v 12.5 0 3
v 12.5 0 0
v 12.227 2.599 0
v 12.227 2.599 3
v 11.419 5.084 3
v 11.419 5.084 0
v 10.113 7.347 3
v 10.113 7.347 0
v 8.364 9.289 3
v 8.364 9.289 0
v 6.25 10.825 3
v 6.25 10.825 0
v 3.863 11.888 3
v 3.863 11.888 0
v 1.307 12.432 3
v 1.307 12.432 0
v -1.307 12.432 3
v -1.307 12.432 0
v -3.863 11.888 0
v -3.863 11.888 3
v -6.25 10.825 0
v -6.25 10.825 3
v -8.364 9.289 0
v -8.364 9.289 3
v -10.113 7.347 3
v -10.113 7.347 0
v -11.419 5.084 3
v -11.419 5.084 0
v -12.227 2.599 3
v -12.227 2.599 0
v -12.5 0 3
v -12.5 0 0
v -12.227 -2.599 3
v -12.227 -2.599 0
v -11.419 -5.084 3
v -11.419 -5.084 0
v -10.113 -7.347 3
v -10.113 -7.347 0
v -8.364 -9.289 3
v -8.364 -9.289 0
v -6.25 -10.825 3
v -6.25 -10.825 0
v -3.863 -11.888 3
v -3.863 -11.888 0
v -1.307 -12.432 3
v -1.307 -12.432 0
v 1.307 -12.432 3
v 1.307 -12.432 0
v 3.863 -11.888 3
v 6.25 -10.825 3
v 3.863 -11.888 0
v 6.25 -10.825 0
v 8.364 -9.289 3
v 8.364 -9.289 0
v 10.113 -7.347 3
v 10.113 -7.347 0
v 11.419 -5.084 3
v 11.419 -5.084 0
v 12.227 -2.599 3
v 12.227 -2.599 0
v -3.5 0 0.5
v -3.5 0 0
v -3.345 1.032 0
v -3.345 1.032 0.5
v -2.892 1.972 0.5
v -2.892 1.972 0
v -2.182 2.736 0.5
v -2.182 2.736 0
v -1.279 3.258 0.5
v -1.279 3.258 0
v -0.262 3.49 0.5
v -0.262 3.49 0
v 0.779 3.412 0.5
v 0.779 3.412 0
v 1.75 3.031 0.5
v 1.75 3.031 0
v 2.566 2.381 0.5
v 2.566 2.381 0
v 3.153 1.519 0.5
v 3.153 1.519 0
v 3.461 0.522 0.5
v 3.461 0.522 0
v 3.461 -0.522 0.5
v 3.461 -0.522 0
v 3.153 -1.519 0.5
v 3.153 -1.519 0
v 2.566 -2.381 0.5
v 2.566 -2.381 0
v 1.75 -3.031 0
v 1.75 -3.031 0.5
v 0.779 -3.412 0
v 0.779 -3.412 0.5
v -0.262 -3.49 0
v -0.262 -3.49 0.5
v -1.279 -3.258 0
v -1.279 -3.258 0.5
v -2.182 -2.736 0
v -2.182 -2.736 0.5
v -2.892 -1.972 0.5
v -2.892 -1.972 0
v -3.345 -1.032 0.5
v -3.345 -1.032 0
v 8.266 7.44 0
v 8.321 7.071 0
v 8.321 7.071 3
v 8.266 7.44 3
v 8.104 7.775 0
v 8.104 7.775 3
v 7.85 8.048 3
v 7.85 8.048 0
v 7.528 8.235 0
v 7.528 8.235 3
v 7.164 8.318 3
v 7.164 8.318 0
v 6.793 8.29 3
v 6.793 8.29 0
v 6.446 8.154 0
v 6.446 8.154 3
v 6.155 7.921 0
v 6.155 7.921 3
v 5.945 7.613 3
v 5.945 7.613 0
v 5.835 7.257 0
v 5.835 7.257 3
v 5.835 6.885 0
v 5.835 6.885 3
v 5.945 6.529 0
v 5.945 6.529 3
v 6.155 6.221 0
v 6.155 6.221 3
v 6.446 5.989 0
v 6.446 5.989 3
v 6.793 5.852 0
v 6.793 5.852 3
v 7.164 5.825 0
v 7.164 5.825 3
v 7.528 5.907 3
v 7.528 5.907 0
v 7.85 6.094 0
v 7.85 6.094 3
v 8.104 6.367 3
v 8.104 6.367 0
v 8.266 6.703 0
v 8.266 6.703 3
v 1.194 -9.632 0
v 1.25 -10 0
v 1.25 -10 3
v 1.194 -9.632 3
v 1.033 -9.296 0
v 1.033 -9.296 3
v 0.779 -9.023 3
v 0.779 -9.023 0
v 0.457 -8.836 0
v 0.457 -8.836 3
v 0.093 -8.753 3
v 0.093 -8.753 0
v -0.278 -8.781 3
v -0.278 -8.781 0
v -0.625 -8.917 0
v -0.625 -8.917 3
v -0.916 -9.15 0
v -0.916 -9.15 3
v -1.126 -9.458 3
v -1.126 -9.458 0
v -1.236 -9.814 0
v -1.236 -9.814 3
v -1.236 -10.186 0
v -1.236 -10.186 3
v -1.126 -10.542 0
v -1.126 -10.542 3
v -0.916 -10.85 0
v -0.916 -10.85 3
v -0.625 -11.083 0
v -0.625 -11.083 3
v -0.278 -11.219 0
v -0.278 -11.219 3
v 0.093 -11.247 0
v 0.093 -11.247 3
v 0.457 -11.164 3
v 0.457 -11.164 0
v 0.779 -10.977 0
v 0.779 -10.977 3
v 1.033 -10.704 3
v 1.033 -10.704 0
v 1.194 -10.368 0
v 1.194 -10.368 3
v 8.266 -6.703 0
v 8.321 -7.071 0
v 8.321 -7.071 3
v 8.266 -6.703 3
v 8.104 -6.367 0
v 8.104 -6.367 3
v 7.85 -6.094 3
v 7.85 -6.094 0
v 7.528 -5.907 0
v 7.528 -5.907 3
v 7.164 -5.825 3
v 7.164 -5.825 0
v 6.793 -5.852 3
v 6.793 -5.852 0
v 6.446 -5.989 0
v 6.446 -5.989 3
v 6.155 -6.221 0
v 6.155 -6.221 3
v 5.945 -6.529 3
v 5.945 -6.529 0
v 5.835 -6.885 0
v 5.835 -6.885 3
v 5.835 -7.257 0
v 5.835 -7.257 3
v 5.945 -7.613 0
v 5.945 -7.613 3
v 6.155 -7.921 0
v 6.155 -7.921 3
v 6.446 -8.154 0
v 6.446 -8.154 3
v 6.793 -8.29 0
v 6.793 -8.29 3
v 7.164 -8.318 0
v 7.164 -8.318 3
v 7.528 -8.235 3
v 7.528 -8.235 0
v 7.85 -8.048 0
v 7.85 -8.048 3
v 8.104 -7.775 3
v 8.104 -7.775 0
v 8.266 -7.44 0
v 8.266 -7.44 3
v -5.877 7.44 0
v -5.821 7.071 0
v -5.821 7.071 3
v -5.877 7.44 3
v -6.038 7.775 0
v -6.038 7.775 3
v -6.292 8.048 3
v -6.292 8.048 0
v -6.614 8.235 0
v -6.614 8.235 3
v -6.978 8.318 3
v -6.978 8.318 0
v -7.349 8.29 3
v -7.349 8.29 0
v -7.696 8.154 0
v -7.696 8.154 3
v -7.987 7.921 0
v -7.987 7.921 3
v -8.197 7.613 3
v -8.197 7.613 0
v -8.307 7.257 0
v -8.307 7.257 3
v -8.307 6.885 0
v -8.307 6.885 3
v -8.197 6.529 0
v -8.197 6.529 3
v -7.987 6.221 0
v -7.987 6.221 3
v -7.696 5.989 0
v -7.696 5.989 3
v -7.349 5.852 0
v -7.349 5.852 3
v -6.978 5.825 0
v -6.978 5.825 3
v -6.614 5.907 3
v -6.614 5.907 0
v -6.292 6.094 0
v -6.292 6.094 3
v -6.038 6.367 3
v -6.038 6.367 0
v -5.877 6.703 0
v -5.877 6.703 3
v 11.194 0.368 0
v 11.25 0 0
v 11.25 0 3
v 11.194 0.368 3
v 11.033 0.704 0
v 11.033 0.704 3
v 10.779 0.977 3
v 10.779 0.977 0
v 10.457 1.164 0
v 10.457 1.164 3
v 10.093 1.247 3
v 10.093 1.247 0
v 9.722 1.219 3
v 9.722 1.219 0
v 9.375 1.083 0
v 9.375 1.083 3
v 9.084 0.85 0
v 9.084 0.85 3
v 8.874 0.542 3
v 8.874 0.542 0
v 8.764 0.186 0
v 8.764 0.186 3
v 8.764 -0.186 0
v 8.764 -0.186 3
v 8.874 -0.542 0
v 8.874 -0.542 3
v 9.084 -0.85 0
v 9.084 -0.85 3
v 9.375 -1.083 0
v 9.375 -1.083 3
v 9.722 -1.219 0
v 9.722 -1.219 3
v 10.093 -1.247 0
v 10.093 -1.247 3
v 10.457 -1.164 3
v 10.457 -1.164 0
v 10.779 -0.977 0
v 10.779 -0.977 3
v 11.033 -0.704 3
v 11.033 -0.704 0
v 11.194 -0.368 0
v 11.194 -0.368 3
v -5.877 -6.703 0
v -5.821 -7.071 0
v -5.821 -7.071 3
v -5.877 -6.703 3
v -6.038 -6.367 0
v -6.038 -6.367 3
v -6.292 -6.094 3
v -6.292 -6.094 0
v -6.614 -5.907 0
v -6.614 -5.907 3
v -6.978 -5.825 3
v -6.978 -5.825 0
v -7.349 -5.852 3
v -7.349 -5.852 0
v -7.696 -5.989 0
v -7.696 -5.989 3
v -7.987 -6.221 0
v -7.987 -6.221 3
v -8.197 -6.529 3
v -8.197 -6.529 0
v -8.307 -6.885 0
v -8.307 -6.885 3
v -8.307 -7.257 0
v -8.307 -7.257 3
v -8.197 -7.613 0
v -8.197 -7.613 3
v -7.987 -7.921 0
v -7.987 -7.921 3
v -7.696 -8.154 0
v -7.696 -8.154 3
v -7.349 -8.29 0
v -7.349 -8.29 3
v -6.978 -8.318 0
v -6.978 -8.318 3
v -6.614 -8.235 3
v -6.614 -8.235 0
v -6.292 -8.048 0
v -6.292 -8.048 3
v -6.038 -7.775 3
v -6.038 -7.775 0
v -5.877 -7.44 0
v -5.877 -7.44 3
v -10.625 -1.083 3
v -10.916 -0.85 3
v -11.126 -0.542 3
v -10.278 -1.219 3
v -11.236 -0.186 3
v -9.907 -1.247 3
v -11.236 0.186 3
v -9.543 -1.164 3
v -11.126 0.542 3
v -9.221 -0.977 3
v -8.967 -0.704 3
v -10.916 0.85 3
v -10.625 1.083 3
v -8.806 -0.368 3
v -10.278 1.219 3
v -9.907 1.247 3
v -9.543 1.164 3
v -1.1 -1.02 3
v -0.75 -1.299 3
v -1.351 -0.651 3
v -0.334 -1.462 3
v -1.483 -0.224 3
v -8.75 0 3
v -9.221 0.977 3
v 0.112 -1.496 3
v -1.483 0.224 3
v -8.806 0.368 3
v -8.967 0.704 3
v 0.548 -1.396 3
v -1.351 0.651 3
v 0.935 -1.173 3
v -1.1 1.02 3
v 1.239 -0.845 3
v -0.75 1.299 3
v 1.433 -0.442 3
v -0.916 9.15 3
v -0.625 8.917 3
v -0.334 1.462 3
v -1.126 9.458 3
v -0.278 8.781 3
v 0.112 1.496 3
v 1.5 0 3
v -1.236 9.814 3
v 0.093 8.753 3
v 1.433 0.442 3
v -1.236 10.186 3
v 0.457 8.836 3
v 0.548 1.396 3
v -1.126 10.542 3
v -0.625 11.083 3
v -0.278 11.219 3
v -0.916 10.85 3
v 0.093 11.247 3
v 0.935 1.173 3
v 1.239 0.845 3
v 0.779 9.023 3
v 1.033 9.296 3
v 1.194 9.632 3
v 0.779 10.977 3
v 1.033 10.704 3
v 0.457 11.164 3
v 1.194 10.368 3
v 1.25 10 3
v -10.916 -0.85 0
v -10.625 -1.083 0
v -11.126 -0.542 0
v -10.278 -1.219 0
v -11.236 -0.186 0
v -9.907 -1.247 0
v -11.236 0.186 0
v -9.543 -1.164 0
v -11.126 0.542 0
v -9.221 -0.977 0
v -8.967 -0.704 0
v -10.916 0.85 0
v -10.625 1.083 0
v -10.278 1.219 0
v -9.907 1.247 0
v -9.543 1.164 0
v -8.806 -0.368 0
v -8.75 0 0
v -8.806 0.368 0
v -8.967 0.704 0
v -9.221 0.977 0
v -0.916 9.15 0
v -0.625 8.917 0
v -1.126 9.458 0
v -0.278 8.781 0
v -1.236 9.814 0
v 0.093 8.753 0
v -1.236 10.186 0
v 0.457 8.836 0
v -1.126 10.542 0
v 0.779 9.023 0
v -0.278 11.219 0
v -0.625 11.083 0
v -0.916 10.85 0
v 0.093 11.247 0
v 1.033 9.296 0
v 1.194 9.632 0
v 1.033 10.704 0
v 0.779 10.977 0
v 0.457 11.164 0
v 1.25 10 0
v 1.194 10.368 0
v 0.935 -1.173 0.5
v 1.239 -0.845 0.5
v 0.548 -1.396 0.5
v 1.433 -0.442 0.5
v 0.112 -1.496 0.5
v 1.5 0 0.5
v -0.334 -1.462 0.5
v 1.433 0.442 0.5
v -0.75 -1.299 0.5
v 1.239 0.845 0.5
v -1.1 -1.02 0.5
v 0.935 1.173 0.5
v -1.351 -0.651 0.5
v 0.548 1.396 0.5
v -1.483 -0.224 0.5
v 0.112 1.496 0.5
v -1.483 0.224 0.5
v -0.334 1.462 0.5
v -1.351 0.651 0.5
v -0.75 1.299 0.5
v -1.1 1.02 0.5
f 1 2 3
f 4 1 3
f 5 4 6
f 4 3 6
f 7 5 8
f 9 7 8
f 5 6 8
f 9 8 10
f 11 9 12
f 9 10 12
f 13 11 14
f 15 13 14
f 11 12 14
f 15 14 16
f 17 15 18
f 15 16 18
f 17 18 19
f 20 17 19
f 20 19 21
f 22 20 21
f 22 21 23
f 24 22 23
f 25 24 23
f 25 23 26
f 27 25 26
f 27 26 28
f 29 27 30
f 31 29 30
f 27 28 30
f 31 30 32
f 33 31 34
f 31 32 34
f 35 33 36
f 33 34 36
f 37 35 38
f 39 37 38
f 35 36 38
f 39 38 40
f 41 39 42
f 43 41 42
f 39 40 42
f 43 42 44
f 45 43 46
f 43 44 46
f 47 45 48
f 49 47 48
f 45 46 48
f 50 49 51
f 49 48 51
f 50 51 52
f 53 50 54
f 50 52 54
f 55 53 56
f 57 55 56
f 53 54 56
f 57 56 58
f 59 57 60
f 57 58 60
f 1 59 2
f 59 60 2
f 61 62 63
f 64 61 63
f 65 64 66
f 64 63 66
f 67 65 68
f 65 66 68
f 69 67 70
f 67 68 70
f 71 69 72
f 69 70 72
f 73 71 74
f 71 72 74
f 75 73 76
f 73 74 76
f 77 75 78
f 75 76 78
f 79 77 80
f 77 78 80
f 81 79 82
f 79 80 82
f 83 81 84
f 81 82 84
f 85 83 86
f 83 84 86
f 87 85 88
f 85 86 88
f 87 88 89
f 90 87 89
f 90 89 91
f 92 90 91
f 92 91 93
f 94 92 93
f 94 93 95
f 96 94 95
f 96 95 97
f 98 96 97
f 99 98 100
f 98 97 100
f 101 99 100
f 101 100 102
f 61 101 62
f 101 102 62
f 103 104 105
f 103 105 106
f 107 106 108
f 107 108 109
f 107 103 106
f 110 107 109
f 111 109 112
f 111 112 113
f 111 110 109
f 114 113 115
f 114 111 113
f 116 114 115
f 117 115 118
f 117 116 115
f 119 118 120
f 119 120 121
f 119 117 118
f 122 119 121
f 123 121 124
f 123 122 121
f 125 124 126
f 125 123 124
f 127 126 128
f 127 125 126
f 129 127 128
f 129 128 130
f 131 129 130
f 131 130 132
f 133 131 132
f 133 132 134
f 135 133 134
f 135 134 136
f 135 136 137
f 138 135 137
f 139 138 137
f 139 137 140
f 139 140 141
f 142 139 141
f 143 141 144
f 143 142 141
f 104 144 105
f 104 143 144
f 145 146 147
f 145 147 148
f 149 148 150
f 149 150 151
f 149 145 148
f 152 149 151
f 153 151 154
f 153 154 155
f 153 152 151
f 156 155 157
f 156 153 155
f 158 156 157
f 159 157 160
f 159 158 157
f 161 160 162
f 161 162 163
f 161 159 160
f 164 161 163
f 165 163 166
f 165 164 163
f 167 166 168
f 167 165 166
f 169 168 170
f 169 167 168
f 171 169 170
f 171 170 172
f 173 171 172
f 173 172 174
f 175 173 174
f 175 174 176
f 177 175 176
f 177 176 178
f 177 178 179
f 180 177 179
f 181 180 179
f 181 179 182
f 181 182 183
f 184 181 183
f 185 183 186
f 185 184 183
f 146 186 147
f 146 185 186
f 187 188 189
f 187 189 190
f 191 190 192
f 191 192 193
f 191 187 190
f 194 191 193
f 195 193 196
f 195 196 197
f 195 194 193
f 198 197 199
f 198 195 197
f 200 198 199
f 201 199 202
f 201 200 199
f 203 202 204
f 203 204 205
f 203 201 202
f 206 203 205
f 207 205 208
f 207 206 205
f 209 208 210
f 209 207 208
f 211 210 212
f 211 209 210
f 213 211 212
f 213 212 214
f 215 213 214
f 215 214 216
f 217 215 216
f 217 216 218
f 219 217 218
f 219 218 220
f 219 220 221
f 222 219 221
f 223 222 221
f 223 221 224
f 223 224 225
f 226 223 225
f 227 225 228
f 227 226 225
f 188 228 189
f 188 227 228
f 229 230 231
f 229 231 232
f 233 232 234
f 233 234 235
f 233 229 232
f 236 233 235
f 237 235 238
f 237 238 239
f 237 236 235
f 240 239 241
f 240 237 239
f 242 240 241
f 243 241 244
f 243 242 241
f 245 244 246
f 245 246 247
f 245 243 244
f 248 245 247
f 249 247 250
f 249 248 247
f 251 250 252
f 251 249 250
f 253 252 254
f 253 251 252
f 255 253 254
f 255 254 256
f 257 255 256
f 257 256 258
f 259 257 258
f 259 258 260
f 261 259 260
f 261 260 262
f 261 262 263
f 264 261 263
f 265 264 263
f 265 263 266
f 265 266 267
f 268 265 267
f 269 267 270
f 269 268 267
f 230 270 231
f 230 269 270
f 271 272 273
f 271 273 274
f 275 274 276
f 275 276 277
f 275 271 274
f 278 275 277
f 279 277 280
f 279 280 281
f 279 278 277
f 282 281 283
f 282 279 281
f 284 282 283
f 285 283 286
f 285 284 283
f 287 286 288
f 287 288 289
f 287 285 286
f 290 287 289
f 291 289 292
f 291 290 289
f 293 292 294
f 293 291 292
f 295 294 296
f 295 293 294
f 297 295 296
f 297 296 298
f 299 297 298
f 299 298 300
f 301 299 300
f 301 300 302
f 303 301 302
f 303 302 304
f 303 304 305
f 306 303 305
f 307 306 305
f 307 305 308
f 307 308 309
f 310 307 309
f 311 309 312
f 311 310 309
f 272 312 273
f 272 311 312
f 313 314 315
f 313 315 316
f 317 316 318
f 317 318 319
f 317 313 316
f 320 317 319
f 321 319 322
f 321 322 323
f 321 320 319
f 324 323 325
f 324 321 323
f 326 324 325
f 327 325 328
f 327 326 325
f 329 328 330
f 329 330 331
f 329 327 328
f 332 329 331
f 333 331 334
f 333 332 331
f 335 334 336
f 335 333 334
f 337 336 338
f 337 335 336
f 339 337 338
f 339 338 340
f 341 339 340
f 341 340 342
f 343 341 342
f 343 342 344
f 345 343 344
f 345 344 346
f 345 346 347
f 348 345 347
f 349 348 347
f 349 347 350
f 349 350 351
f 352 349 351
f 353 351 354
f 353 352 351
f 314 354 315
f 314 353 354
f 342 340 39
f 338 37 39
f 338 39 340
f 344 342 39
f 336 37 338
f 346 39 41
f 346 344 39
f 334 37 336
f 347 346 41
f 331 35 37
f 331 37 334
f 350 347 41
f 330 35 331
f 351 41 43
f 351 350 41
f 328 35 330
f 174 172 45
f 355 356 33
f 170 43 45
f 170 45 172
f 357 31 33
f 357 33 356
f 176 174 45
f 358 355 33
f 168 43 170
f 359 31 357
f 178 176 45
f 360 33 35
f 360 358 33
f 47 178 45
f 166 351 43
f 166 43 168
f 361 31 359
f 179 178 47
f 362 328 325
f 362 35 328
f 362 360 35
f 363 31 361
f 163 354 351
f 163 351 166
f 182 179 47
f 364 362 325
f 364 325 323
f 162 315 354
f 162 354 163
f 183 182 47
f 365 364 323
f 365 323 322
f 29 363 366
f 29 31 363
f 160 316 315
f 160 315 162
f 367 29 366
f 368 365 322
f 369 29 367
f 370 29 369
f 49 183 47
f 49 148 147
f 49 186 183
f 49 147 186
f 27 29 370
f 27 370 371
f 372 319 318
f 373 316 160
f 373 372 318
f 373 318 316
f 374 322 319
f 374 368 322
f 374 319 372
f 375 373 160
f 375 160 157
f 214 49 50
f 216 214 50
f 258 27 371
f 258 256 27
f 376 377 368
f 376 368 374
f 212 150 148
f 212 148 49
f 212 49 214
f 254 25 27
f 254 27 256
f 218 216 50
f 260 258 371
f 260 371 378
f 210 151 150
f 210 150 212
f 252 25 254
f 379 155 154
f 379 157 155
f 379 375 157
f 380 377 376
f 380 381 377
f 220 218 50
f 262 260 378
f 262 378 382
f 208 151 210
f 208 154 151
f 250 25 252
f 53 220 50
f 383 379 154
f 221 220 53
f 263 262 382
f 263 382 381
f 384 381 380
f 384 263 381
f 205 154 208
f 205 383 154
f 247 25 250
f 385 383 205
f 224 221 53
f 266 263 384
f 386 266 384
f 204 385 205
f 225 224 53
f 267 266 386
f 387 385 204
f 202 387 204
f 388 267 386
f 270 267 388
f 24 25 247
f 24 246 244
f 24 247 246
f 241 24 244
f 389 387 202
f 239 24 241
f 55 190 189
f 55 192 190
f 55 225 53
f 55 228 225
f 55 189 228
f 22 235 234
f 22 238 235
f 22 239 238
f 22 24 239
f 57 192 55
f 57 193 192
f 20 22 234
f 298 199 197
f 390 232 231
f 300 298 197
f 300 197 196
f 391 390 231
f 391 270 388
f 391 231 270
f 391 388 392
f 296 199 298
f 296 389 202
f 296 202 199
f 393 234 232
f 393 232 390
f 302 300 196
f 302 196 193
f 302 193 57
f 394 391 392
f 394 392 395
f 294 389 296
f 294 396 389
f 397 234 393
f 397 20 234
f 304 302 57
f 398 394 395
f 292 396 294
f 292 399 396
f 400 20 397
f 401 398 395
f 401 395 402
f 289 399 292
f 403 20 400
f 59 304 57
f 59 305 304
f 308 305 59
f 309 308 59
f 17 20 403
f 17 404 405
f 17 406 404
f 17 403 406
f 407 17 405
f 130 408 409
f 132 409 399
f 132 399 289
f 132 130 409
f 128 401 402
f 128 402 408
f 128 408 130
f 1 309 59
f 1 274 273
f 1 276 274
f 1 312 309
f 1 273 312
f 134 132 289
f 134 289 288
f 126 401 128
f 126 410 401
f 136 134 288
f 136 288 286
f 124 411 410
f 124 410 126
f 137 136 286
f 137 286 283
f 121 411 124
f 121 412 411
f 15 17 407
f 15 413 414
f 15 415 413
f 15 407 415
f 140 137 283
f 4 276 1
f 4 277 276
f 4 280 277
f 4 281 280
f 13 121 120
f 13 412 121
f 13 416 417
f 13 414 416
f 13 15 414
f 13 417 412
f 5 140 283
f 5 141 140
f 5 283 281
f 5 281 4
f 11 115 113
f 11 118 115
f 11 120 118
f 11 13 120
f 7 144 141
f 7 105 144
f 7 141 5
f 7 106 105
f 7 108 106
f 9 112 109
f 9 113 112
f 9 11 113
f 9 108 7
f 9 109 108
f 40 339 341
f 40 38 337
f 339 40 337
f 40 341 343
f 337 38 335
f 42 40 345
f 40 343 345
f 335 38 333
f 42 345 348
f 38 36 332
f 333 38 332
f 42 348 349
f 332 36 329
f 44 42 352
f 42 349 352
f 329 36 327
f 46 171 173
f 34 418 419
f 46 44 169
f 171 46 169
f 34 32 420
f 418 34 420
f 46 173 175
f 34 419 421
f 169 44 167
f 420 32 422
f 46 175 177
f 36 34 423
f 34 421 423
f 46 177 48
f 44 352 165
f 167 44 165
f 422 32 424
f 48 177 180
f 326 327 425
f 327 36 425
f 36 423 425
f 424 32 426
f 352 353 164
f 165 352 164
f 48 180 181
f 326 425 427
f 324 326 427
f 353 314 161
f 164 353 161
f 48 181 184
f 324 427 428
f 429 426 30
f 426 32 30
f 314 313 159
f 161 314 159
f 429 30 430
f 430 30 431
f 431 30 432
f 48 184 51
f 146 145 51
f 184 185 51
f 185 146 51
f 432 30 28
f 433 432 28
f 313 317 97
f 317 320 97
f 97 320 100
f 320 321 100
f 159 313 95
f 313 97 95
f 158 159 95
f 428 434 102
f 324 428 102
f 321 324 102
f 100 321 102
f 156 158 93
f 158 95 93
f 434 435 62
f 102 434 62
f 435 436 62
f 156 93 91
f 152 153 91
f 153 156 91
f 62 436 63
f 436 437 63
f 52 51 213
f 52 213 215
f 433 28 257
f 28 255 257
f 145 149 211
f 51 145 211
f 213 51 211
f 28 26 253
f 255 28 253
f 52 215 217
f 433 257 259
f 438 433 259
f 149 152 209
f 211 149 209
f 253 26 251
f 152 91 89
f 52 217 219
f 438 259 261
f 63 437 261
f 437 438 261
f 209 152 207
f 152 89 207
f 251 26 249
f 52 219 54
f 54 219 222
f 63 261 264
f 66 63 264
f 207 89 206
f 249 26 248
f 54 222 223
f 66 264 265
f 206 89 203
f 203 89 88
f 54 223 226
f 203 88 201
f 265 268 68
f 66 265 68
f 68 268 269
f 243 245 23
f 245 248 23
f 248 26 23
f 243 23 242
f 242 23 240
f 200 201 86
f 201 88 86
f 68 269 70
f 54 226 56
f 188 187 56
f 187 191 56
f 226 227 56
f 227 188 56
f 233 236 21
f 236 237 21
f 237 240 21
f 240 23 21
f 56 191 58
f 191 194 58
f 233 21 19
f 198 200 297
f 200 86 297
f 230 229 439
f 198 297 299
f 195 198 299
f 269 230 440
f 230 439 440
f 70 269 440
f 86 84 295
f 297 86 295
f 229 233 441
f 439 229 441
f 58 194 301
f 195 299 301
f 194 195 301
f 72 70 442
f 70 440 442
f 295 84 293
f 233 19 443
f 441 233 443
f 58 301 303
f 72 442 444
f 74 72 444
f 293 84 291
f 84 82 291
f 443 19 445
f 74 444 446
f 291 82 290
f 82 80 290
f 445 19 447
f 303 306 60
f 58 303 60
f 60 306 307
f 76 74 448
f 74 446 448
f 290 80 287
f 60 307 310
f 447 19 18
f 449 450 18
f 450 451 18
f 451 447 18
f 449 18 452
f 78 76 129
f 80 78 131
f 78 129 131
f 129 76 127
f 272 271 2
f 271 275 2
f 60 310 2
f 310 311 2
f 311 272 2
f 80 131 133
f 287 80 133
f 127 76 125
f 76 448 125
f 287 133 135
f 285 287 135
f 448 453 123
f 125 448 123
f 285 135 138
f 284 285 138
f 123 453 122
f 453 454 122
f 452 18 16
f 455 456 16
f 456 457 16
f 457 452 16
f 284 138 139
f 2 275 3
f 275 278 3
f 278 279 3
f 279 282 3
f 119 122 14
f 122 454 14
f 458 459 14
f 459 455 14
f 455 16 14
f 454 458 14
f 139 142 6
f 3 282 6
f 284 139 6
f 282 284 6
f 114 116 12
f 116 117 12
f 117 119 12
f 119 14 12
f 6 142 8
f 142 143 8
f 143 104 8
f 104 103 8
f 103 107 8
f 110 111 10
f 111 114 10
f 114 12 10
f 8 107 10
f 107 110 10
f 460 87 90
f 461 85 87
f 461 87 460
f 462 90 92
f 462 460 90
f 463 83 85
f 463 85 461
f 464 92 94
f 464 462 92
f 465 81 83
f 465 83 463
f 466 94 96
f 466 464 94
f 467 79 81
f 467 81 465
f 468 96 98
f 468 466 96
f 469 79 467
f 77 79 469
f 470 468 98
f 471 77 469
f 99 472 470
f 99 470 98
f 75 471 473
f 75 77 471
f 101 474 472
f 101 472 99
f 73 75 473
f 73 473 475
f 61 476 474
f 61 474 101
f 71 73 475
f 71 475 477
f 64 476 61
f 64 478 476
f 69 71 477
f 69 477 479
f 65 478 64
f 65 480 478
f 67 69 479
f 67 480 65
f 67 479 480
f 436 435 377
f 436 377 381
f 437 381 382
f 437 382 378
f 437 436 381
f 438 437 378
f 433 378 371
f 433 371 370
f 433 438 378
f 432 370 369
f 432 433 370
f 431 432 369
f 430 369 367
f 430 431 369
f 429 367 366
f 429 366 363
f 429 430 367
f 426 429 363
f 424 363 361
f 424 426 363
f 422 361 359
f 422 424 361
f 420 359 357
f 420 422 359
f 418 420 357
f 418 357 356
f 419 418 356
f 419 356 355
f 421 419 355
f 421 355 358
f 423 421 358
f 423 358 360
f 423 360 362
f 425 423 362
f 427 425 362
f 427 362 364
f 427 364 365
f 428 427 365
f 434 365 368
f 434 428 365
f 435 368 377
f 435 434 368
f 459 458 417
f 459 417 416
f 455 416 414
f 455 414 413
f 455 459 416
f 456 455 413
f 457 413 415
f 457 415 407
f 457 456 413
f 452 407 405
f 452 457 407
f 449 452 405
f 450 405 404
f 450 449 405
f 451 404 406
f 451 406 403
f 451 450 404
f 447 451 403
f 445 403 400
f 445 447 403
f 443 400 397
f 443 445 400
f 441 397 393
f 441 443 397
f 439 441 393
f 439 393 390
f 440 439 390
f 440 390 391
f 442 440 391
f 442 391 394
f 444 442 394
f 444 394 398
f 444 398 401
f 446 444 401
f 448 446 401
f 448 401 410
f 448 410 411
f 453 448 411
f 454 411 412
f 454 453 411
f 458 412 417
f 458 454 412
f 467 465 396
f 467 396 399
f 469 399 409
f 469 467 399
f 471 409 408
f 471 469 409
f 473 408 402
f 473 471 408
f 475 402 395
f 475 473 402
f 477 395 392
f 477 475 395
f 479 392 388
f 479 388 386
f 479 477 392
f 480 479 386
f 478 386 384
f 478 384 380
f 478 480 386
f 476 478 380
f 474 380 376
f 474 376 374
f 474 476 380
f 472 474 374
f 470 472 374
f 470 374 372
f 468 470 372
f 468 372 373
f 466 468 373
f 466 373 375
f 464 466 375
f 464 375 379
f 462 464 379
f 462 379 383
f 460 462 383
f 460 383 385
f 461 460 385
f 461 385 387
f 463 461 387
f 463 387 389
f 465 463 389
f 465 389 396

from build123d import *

# Parameters (mm, degrees)
SKETCH1_R           = 12.5
SKETCH1_R_2         = 1.25
SKETCH1_R_3         = 1.5
BOSS_EXTRUDE1_DEPTH = 3
SKETCH3_R           = 3.5
SKETCH3_R_2         = 1.5
CUT_EXTRUDE1_DEPTH  = 0.5


with BuildPart() as part:
    # Sketch1 → Boss-Extrude1 (new body)
    with BuildSketch(Plane.XY):
        Circle(SKETCH1_R)
        with Locations((0, 10)):
            Circle(SKETCH1_R_2, mode=Mode.SUBTRACT)
        Circle(SKETCH1_R_3, mode=Mode.SUBTRACT)
        with Locations((7.071067812, 7.071067812)):
            Circle(SKETCH1_R_2, mode=Mode.SUBTRACT)
        with Locations((10, 0)):
            Circle(SKETCH1_R_2, mode=Mode.SUBTRACT)
        with Locations((7.071067812, -7.071067812)):
            Circle(SKETCH1_R_2, mode=Mode.SUBTRACT)
        with Locations((0, -10)):
            Circle(SKETCH1_R_2, mode=Mode.SUBTRACT)
        with Locations((-7.071067812, -7.071067812)):
            Circle(SKETCH1_R_2, mode=Mode.SUBTRACT)
        with Locations((-10, 0)):
            Circle(SKETCH1_R_2, mode=Mode.SUBTRACT)
        with Locations((-7.071067812, 7.071067812)):
            Circle(SKETCH1_R_2, mode=Mode.SUBTRACT)
    extrude(amount=BOSS_EXTRUDE1_DEPTH)

    # Sketch3 → Cut-Extrude1 (cut)
    with BuildSketch(Plane(origin=(0, 0, 0), x_dir=(-1, 0, 0), z_dir=(0, 0, -1))):
        Circle(SKETCH3_R)
        Circle(SKETCH3_R_2, mode=Mode.SUBTRACT)
    extrude(amount=-CUT_EXTRUDE1_DEPTH, mode=Mode.SUBTRACT)


solid = part.part
